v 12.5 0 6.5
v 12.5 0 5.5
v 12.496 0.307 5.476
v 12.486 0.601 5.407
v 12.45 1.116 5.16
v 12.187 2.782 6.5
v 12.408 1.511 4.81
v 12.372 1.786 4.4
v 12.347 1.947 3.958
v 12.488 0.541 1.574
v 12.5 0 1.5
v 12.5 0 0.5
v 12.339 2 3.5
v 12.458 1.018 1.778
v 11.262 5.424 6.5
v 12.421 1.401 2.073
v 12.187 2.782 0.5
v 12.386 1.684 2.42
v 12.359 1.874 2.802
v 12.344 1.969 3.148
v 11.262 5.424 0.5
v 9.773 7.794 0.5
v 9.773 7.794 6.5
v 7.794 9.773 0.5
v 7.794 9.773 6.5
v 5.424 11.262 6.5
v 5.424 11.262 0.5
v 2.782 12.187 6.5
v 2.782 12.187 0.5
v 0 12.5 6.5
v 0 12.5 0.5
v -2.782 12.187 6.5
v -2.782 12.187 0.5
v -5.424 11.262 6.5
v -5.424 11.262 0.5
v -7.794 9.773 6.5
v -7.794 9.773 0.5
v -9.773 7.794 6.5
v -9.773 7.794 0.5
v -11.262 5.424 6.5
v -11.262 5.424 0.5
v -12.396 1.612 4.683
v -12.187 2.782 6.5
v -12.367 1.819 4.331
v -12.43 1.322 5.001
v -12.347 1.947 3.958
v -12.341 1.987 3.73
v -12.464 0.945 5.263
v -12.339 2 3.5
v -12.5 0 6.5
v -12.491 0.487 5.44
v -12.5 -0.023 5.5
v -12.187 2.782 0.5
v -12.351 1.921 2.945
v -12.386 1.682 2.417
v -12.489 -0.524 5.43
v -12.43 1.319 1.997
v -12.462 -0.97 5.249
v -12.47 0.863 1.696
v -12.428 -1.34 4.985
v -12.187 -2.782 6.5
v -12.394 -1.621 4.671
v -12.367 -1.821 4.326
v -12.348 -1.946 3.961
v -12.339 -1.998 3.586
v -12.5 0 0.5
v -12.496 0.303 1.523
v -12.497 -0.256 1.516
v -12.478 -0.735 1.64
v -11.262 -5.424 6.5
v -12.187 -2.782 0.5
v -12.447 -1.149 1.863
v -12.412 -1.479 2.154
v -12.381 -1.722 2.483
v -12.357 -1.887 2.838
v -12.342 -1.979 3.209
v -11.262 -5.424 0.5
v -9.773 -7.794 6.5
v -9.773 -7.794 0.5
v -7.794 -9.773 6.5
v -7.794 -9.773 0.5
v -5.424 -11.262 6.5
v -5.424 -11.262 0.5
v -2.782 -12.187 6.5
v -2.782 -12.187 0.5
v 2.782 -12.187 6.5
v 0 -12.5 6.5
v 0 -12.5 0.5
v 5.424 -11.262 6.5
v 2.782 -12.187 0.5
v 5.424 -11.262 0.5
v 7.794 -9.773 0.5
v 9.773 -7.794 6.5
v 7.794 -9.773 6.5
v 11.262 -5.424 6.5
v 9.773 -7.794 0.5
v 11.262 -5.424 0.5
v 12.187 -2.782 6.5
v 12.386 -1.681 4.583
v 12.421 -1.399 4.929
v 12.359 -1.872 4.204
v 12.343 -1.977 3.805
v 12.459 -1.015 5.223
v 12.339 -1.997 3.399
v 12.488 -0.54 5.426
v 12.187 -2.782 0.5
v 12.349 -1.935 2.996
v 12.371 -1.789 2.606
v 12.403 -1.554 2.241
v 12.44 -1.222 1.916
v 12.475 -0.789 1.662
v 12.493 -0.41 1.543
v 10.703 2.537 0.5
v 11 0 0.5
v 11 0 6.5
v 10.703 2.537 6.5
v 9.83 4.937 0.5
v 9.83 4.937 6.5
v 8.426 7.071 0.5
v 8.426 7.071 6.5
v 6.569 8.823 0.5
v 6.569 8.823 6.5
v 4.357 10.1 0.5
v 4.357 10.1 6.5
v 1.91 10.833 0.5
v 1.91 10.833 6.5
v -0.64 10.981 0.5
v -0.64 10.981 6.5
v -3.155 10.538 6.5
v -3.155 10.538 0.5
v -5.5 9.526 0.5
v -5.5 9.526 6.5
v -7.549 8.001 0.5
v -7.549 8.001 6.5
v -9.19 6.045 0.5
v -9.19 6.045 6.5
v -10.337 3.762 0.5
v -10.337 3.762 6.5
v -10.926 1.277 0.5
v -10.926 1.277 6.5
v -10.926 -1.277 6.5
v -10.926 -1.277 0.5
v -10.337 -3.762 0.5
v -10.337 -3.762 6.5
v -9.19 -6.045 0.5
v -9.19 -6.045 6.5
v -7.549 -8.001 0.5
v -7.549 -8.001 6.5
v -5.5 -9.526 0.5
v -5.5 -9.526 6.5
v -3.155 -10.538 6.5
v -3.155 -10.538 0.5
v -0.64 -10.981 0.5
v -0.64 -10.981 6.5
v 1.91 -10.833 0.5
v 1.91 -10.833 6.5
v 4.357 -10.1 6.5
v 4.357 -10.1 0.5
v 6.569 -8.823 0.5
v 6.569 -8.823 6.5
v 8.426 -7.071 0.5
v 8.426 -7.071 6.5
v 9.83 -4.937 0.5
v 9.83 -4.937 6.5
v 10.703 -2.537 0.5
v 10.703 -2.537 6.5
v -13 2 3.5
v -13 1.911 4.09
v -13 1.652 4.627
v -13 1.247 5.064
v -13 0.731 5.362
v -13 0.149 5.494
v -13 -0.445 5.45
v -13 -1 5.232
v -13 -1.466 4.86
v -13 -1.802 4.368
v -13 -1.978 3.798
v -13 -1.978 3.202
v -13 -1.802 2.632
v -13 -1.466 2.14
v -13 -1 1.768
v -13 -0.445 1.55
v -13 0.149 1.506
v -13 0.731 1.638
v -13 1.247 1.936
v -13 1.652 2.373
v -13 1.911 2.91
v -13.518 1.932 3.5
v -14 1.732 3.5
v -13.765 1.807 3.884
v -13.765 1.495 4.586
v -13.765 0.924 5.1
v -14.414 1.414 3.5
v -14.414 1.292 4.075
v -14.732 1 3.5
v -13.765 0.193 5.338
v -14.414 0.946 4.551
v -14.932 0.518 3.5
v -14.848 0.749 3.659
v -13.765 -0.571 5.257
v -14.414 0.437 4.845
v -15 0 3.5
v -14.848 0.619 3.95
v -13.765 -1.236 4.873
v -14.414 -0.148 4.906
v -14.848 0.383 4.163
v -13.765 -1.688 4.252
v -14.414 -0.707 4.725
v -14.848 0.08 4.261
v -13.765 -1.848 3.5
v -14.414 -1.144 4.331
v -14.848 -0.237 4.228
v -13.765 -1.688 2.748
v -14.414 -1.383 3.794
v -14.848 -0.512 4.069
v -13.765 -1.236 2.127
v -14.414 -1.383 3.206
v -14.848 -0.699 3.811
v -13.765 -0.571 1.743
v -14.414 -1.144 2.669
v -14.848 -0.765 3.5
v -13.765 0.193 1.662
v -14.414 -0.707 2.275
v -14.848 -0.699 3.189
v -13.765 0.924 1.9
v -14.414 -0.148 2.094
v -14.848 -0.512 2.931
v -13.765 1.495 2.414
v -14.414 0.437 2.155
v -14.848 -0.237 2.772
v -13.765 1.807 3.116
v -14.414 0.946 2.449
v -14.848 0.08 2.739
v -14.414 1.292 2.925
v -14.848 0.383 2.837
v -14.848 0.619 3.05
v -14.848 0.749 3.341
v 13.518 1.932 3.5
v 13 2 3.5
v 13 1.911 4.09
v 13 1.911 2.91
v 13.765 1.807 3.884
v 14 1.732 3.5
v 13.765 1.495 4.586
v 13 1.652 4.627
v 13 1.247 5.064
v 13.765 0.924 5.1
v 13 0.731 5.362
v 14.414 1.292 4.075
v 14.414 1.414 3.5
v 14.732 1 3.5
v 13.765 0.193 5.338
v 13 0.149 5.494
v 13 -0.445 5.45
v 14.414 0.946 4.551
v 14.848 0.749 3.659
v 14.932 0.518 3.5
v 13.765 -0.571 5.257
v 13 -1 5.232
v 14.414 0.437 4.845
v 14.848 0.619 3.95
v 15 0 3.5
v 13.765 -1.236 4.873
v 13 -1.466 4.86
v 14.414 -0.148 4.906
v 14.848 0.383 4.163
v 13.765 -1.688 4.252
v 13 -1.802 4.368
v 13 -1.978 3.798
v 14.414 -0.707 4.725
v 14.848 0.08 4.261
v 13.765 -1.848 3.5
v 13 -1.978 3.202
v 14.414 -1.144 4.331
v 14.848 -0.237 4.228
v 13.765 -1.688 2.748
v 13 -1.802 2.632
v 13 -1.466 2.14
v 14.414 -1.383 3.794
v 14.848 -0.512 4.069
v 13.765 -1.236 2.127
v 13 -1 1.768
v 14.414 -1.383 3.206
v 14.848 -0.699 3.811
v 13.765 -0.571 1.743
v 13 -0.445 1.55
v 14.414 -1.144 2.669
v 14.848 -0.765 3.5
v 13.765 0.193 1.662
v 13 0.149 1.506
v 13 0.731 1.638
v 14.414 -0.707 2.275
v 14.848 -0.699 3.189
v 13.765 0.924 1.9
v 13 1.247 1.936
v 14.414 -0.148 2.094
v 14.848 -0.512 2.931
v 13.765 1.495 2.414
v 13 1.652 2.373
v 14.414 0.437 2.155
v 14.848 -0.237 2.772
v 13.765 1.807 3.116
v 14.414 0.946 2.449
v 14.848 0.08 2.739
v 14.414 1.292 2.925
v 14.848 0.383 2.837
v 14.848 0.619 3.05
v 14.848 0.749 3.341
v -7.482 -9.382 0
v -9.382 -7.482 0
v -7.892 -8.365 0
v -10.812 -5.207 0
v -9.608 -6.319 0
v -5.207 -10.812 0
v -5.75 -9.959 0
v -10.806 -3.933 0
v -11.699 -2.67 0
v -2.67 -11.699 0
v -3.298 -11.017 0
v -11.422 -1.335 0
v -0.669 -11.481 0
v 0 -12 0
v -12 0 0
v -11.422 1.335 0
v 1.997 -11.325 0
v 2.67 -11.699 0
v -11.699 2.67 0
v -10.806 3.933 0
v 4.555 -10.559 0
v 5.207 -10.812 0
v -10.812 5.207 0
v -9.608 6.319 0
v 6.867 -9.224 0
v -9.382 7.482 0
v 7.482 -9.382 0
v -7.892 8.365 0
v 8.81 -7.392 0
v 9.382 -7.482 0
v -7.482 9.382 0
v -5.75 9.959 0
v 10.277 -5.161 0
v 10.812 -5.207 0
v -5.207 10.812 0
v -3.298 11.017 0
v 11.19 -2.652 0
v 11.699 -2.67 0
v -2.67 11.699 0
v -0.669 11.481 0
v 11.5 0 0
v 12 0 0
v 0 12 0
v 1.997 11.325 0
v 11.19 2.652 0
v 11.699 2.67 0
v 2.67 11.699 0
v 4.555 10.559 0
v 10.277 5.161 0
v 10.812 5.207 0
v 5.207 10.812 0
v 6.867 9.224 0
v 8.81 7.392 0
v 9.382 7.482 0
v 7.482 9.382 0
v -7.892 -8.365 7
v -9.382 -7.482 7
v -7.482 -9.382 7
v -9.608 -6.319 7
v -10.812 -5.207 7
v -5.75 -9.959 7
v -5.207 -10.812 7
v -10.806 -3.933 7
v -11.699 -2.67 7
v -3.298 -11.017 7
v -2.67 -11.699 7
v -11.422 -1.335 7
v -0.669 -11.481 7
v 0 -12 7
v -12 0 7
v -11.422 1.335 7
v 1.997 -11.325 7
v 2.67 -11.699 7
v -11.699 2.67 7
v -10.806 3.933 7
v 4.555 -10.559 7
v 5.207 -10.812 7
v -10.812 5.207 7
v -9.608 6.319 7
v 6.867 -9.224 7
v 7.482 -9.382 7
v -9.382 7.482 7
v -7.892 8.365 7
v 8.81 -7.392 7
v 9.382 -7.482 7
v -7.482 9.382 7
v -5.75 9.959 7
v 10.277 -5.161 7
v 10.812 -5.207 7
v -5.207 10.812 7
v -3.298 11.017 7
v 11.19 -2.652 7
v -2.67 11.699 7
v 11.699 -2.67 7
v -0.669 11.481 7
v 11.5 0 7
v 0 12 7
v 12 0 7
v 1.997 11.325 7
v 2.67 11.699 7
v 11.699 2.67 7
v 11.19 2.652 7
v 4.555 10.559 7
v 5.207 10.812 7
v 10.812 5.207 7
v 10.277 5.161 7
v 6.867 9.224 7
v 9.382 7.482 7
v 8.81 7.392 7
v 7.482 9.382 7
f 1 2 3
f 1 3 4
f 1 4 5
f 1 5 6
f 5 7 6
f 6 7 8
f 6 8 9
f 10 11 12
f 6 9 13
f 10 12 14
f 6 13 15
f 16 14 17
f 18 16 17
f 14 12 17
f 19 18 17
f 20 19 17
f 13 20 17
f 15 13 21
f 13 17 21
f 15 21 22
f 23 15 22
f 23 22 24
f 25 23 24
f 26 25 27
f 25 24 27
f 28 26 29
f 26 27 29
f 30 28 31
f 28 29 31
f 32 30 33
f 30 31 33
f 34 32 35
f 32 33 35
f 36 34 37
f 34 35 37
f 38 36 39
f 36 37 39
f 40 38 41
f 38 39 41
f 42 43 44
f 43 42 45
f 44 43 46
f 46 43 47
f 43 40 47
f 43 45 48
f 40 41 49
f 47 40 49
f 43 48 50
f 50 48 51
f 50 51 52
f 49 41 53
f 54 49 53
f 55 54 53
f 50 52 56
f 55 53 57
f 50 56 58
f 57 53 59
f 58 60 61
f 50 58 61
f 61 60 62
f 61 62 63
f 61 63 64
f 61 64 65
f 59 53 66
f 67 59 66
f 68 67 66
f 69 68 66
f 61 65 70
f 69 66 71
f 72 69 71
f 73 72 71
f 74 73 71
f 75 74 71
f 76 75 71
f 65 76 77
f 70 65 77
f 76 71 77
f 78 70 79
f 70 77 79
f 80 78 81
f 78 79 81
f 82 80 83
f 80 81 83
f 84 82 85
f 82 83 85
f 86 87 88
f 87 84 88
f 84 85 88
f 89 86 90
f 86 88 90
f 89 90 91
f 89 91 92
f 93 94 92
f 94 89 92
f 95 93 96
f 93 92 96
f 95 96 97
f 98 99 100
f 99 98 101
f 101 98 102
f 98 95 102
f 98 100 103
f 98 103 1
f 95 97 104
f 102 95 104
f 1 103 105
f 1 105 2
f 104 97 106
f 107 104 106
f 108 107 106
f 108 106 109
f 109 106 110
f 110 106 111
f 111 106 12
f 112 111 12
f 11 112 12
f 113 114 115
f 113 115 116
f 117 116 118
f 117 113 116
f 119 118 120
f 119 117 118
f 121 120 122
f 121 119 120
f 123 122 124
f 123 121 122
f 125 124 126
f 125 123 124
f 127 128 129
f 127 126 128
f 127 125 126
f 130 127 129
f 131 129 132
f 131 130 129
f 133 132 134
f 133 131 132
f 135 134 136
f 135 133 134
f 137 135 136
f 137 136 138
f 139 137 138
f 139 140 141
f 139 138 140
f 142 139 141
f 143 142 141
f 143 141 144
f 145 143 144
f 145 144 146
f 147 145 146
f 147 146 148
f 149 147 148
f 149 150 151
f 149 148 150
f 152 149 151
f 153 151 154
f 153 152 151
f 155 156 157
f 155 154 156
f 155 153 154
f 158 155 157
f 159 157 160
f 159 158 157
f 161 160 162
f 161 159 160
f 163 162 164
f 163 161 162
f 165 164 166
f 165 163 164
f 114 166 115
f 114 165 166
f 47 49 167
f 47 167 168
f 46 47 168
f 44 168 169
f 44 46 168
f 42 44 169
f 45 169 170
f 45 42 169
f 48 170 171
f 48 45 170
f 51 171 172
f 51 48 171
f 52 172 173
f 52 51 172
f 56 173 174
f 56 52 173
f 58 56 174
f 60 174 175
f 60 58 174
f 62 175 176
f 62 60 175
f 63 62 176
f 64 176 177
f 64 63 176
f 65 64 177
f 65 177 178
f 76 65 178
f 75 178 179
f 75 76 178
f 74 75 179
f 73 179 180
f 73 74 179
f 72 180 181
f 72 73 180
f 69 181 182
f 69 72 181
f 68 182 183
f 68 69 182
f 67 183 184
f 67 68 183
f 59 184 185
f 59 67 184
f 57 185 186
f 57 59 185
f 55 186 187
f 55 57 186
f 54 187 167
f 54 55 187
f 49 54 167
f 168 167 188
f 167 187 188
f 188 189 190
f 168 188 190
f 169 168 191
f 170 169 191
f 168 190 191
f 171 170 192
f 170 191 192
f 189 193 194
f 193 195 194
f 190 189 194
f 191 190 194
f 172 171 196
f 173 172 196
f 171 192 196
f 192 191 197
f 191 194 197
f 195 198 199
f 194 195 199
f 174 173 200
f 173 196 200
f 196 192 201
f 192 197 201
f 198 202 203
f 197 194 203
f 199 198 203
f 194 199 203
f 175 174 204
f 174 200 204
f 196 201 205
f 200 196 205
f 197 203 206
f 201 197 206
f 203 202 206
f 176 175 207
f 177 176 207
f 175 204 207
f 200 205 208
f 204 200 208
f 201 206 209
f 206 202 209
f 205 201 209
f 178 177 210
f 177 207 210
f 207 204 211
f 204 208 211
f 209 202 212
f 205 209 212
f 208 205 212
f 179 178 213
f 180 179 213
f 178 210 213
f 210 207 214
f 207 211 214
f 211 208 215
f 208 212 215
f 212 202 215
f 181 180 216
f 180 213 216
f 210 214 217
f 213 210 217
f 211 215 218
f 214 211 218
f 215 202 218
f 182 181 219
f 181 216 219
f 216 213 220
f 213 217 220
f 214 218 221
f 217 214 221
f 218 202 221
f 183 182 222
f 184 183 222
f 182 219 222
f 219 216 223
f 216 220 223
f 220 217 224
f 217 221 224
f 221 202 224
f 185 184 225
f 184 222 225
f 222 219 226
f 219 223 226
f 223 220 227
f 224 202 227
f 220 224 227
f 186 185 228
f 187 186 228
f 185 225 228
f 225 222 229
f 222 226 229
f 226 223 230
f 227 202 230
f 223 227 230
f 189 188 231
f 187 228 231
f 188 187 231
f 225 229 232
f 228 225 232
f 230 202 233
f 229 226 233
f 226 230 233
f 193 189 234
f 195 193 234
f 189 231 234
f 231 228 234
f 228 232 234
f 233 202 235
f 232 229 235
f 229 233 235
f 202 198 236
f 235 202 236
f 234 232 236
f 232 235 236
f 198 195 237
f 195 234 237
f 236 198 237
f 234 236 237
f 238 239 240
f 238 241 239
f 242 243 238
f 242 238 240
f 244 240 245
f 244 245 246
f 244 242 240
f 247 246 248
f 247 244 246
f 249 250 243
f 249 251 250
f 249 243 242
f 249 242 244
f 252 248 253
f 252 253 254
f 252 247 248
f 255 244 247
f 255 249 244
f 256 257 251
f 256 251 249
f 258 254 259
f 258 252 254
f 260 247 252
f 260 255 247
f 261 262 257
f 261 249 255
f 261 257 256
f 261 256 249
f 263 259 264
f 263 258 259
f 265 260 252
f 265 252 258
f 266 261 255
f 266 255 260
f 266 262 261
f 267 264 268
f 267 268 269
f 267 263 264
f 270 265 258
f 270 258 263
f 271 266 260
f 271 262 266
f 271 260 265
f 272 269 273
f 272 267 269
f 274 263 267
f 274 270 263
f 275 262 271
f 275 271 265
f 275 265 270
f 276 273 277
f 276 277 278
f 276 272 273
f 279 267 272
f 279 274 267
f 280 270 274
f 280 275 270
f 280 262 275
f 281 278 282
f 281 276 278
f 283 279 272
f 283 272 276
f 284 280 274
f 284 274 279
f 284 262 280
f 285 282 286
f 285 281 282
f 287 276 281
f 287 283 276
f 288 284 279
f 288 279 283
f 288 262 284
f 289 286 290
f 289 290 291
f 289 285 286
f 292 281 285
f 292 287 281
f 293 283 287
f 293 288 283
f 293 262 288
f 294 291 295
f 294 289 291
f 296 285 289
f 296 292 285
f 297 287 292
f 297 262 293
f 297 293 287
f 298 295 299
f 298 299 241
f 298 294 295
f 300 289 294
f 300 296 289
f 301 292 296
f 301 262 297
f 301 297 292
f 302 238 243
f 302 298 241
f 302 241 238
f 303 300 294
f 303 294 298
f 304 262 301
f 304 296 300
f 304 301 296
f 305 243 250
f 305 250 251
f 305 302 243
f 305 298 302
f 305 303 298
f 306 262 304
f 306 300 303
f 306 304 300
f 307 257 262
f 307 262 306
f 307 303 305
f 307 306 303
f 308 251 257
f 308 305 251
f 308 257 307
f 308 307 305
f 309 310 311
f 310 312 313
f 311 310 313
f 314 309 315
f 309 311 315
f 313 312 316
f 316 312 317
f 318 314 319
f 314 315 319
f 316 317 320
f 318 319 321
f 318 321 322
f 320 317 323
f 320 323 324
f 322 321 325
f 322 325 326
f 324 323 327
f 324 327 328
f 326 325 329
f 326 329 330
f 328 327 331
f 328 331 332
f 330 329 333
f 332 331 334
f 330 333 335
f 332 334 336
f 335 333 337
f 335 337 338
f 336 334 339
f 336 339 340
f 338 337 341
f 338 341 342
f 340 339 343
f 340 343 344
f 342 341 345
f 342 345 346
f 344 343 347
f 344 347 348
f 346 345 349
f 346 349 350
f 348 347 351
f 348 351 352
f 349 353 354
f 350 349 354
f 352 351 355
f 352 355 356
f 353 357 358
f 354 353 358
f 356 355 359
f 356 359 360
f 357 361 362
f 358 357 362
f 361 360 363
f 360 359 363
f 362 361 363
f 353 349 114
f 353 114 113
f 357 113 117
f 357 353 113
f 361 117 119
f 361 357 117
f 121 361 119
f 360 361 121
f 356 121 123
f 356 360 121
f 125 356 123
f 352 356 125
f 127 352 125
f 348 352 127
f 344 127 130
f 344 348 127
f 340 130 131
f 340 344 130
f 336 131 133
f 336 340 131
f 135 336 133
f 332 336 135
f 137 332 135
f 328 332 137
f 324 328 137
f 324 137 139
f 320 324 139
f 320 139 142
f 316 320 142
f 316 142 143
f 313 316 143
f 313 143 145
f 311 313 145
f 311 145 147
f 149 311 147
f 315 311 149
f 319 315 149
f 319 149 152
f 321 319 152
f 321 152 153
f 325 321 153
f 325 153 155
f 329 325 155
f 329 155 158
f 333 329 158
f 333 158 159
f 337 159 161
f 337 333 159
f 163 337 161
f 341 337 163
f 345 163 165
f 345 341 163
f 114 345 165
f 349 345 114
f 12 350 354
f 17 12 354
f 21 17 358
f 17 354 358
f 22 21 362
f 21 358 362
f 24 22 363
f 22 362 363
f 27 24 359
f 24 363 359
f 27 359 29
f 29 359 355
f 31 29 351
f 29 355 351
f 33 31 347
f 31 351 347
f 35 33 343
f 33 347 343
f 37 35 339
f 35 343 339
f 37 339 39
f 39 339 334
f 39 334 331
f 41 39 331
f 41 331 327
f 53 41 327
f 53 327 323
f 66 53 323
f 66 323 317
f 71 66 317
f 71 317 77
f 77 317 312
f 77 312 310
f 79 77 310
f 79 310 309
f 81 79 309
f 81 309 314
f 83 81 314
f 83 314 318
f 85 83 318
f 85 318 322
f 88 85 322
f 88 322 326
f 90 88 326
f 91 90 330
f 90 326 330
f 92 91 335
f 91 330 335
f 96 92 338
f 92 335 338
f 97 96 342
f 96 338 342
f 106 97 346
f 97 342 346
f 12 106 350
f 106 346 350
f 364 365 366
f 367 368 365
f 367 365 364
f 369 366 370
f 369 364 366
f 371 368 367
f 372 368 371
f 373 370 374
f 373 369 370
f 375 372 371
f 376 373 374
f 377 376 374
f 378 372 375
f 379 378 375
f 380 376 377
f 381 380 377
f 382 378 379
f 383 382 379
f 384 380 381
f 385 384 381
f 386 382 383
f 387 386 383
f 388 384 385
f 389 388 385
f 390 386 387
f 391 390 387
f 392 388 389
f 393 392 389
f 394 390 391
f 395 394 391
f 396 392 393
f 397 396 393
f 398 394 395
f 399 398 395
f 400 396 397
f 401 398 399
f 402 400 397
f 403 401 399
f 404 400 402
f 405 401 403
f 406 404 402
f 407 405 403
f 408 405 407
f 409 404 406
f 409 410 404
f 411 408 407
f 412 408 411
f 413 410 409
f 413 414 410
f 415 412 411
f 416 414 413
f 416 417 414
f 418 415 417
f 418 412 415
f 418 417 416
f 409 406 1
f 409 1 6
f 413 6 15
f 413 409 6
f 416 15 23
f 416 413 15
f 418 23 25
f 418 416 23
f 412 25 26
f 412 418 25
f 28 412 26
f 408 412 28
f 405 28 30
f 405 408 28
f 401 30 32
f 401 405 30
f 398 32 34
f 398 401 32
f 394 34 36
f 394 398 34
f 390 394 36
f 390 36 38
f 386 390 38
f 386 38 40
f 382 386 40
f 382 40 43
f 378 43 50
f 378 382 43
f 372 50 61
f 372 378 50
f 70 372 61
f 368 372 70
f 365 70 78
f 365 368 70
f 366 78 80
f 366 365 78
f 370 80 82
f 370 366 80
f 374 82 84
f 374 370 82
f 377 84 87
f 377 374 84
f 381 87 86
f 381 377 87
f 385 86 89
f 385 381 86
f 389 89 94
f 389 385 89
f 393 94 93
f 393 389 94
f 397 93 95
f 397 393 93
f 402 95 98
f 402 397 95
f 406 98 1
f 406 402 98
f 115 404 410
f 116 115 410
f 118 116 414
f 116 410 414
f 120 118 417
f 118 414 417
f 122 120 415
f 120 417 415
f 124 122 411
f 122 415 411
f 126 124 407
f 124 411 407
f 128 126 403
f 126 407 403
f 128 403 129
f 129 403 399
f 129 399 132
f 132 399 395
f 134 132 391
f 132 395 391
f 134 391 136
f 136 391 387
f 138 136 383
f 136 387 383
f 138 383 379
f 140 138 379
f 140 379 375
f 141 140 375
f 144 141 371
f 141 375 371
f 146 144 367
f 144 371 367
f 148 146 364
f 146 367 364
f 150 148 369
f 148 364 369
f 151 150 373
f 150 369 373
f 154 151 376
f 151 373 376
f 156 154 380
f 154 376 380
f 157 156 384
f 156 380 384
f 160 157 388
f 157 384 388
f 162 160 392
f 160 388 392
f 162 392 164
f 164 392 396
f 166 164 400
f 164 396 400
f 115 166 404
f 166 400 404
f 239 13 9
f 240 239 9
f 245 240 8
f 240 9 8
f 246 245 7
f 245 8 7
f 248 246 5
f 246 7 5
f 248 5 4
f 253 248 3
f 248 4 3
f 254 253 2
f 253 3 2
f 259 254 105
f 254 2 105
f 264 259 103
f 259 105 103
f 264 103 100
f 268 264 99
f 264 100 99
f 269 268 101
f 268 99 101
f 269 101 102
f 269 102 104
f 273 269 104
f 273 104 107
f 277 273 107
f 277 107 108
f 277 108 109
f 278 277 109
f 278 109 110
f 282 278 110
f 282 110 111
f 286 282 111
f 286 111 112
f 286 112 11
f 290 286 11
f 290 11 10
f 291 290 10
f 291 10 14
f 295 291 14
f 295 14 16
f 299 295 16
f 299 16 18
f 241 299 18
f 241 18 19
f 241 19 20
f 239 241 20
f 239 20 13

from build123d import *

# Parameters (mm, degrees)
F0_R     = 12.5
F0_R_2   = 11
F1_DEPTH = 7
F2_SIZE  = 0.5
F4_R     = 2
F5_DEPTH = 4
F7_R     = 2


with BuildPart() as f1:
    # F0 (on Top) → F1 (new body)
    with BuildSketch(Plane.XY):
        Circle(F0_R)
        Circle(F0_R_2, mode=Mode.SUBTRACT)
    extrude(amount=F1_DEPTH)

    # F2
    f2_edges = [f1.edges().sort_by_distance(p)[0] for p in [
        (-11, 0, 7),
        (-12.5, 0, 7),
        (-12.5, 0, 0),
        (-11, 0, 0),
    ]]
    chamfer(f2_edges, length=F2_SIZE)

    # F4 (on offset) → F5 (join)
    with BuildSketch(Plane.YZ.offset(11)):
        with Locations((0, 3.5)):
            Circle(F4_R)
    extrude(amount=F5_DEPTH)

    # F6: F1 across plane


with BuildPart() as f1_1:
    add(f1.part)
    add(f1.part.mirror(Plane.YZ))

    # F7
    f7_edges = [f1_1.edges().sort_by_distance(p)[0] for p in [
        (-15, -2, 3.5),
        (15, -2, 3.5),
    ]]
    fillet(f7_edges, radius=F7_R)


solid = f1_1.part
